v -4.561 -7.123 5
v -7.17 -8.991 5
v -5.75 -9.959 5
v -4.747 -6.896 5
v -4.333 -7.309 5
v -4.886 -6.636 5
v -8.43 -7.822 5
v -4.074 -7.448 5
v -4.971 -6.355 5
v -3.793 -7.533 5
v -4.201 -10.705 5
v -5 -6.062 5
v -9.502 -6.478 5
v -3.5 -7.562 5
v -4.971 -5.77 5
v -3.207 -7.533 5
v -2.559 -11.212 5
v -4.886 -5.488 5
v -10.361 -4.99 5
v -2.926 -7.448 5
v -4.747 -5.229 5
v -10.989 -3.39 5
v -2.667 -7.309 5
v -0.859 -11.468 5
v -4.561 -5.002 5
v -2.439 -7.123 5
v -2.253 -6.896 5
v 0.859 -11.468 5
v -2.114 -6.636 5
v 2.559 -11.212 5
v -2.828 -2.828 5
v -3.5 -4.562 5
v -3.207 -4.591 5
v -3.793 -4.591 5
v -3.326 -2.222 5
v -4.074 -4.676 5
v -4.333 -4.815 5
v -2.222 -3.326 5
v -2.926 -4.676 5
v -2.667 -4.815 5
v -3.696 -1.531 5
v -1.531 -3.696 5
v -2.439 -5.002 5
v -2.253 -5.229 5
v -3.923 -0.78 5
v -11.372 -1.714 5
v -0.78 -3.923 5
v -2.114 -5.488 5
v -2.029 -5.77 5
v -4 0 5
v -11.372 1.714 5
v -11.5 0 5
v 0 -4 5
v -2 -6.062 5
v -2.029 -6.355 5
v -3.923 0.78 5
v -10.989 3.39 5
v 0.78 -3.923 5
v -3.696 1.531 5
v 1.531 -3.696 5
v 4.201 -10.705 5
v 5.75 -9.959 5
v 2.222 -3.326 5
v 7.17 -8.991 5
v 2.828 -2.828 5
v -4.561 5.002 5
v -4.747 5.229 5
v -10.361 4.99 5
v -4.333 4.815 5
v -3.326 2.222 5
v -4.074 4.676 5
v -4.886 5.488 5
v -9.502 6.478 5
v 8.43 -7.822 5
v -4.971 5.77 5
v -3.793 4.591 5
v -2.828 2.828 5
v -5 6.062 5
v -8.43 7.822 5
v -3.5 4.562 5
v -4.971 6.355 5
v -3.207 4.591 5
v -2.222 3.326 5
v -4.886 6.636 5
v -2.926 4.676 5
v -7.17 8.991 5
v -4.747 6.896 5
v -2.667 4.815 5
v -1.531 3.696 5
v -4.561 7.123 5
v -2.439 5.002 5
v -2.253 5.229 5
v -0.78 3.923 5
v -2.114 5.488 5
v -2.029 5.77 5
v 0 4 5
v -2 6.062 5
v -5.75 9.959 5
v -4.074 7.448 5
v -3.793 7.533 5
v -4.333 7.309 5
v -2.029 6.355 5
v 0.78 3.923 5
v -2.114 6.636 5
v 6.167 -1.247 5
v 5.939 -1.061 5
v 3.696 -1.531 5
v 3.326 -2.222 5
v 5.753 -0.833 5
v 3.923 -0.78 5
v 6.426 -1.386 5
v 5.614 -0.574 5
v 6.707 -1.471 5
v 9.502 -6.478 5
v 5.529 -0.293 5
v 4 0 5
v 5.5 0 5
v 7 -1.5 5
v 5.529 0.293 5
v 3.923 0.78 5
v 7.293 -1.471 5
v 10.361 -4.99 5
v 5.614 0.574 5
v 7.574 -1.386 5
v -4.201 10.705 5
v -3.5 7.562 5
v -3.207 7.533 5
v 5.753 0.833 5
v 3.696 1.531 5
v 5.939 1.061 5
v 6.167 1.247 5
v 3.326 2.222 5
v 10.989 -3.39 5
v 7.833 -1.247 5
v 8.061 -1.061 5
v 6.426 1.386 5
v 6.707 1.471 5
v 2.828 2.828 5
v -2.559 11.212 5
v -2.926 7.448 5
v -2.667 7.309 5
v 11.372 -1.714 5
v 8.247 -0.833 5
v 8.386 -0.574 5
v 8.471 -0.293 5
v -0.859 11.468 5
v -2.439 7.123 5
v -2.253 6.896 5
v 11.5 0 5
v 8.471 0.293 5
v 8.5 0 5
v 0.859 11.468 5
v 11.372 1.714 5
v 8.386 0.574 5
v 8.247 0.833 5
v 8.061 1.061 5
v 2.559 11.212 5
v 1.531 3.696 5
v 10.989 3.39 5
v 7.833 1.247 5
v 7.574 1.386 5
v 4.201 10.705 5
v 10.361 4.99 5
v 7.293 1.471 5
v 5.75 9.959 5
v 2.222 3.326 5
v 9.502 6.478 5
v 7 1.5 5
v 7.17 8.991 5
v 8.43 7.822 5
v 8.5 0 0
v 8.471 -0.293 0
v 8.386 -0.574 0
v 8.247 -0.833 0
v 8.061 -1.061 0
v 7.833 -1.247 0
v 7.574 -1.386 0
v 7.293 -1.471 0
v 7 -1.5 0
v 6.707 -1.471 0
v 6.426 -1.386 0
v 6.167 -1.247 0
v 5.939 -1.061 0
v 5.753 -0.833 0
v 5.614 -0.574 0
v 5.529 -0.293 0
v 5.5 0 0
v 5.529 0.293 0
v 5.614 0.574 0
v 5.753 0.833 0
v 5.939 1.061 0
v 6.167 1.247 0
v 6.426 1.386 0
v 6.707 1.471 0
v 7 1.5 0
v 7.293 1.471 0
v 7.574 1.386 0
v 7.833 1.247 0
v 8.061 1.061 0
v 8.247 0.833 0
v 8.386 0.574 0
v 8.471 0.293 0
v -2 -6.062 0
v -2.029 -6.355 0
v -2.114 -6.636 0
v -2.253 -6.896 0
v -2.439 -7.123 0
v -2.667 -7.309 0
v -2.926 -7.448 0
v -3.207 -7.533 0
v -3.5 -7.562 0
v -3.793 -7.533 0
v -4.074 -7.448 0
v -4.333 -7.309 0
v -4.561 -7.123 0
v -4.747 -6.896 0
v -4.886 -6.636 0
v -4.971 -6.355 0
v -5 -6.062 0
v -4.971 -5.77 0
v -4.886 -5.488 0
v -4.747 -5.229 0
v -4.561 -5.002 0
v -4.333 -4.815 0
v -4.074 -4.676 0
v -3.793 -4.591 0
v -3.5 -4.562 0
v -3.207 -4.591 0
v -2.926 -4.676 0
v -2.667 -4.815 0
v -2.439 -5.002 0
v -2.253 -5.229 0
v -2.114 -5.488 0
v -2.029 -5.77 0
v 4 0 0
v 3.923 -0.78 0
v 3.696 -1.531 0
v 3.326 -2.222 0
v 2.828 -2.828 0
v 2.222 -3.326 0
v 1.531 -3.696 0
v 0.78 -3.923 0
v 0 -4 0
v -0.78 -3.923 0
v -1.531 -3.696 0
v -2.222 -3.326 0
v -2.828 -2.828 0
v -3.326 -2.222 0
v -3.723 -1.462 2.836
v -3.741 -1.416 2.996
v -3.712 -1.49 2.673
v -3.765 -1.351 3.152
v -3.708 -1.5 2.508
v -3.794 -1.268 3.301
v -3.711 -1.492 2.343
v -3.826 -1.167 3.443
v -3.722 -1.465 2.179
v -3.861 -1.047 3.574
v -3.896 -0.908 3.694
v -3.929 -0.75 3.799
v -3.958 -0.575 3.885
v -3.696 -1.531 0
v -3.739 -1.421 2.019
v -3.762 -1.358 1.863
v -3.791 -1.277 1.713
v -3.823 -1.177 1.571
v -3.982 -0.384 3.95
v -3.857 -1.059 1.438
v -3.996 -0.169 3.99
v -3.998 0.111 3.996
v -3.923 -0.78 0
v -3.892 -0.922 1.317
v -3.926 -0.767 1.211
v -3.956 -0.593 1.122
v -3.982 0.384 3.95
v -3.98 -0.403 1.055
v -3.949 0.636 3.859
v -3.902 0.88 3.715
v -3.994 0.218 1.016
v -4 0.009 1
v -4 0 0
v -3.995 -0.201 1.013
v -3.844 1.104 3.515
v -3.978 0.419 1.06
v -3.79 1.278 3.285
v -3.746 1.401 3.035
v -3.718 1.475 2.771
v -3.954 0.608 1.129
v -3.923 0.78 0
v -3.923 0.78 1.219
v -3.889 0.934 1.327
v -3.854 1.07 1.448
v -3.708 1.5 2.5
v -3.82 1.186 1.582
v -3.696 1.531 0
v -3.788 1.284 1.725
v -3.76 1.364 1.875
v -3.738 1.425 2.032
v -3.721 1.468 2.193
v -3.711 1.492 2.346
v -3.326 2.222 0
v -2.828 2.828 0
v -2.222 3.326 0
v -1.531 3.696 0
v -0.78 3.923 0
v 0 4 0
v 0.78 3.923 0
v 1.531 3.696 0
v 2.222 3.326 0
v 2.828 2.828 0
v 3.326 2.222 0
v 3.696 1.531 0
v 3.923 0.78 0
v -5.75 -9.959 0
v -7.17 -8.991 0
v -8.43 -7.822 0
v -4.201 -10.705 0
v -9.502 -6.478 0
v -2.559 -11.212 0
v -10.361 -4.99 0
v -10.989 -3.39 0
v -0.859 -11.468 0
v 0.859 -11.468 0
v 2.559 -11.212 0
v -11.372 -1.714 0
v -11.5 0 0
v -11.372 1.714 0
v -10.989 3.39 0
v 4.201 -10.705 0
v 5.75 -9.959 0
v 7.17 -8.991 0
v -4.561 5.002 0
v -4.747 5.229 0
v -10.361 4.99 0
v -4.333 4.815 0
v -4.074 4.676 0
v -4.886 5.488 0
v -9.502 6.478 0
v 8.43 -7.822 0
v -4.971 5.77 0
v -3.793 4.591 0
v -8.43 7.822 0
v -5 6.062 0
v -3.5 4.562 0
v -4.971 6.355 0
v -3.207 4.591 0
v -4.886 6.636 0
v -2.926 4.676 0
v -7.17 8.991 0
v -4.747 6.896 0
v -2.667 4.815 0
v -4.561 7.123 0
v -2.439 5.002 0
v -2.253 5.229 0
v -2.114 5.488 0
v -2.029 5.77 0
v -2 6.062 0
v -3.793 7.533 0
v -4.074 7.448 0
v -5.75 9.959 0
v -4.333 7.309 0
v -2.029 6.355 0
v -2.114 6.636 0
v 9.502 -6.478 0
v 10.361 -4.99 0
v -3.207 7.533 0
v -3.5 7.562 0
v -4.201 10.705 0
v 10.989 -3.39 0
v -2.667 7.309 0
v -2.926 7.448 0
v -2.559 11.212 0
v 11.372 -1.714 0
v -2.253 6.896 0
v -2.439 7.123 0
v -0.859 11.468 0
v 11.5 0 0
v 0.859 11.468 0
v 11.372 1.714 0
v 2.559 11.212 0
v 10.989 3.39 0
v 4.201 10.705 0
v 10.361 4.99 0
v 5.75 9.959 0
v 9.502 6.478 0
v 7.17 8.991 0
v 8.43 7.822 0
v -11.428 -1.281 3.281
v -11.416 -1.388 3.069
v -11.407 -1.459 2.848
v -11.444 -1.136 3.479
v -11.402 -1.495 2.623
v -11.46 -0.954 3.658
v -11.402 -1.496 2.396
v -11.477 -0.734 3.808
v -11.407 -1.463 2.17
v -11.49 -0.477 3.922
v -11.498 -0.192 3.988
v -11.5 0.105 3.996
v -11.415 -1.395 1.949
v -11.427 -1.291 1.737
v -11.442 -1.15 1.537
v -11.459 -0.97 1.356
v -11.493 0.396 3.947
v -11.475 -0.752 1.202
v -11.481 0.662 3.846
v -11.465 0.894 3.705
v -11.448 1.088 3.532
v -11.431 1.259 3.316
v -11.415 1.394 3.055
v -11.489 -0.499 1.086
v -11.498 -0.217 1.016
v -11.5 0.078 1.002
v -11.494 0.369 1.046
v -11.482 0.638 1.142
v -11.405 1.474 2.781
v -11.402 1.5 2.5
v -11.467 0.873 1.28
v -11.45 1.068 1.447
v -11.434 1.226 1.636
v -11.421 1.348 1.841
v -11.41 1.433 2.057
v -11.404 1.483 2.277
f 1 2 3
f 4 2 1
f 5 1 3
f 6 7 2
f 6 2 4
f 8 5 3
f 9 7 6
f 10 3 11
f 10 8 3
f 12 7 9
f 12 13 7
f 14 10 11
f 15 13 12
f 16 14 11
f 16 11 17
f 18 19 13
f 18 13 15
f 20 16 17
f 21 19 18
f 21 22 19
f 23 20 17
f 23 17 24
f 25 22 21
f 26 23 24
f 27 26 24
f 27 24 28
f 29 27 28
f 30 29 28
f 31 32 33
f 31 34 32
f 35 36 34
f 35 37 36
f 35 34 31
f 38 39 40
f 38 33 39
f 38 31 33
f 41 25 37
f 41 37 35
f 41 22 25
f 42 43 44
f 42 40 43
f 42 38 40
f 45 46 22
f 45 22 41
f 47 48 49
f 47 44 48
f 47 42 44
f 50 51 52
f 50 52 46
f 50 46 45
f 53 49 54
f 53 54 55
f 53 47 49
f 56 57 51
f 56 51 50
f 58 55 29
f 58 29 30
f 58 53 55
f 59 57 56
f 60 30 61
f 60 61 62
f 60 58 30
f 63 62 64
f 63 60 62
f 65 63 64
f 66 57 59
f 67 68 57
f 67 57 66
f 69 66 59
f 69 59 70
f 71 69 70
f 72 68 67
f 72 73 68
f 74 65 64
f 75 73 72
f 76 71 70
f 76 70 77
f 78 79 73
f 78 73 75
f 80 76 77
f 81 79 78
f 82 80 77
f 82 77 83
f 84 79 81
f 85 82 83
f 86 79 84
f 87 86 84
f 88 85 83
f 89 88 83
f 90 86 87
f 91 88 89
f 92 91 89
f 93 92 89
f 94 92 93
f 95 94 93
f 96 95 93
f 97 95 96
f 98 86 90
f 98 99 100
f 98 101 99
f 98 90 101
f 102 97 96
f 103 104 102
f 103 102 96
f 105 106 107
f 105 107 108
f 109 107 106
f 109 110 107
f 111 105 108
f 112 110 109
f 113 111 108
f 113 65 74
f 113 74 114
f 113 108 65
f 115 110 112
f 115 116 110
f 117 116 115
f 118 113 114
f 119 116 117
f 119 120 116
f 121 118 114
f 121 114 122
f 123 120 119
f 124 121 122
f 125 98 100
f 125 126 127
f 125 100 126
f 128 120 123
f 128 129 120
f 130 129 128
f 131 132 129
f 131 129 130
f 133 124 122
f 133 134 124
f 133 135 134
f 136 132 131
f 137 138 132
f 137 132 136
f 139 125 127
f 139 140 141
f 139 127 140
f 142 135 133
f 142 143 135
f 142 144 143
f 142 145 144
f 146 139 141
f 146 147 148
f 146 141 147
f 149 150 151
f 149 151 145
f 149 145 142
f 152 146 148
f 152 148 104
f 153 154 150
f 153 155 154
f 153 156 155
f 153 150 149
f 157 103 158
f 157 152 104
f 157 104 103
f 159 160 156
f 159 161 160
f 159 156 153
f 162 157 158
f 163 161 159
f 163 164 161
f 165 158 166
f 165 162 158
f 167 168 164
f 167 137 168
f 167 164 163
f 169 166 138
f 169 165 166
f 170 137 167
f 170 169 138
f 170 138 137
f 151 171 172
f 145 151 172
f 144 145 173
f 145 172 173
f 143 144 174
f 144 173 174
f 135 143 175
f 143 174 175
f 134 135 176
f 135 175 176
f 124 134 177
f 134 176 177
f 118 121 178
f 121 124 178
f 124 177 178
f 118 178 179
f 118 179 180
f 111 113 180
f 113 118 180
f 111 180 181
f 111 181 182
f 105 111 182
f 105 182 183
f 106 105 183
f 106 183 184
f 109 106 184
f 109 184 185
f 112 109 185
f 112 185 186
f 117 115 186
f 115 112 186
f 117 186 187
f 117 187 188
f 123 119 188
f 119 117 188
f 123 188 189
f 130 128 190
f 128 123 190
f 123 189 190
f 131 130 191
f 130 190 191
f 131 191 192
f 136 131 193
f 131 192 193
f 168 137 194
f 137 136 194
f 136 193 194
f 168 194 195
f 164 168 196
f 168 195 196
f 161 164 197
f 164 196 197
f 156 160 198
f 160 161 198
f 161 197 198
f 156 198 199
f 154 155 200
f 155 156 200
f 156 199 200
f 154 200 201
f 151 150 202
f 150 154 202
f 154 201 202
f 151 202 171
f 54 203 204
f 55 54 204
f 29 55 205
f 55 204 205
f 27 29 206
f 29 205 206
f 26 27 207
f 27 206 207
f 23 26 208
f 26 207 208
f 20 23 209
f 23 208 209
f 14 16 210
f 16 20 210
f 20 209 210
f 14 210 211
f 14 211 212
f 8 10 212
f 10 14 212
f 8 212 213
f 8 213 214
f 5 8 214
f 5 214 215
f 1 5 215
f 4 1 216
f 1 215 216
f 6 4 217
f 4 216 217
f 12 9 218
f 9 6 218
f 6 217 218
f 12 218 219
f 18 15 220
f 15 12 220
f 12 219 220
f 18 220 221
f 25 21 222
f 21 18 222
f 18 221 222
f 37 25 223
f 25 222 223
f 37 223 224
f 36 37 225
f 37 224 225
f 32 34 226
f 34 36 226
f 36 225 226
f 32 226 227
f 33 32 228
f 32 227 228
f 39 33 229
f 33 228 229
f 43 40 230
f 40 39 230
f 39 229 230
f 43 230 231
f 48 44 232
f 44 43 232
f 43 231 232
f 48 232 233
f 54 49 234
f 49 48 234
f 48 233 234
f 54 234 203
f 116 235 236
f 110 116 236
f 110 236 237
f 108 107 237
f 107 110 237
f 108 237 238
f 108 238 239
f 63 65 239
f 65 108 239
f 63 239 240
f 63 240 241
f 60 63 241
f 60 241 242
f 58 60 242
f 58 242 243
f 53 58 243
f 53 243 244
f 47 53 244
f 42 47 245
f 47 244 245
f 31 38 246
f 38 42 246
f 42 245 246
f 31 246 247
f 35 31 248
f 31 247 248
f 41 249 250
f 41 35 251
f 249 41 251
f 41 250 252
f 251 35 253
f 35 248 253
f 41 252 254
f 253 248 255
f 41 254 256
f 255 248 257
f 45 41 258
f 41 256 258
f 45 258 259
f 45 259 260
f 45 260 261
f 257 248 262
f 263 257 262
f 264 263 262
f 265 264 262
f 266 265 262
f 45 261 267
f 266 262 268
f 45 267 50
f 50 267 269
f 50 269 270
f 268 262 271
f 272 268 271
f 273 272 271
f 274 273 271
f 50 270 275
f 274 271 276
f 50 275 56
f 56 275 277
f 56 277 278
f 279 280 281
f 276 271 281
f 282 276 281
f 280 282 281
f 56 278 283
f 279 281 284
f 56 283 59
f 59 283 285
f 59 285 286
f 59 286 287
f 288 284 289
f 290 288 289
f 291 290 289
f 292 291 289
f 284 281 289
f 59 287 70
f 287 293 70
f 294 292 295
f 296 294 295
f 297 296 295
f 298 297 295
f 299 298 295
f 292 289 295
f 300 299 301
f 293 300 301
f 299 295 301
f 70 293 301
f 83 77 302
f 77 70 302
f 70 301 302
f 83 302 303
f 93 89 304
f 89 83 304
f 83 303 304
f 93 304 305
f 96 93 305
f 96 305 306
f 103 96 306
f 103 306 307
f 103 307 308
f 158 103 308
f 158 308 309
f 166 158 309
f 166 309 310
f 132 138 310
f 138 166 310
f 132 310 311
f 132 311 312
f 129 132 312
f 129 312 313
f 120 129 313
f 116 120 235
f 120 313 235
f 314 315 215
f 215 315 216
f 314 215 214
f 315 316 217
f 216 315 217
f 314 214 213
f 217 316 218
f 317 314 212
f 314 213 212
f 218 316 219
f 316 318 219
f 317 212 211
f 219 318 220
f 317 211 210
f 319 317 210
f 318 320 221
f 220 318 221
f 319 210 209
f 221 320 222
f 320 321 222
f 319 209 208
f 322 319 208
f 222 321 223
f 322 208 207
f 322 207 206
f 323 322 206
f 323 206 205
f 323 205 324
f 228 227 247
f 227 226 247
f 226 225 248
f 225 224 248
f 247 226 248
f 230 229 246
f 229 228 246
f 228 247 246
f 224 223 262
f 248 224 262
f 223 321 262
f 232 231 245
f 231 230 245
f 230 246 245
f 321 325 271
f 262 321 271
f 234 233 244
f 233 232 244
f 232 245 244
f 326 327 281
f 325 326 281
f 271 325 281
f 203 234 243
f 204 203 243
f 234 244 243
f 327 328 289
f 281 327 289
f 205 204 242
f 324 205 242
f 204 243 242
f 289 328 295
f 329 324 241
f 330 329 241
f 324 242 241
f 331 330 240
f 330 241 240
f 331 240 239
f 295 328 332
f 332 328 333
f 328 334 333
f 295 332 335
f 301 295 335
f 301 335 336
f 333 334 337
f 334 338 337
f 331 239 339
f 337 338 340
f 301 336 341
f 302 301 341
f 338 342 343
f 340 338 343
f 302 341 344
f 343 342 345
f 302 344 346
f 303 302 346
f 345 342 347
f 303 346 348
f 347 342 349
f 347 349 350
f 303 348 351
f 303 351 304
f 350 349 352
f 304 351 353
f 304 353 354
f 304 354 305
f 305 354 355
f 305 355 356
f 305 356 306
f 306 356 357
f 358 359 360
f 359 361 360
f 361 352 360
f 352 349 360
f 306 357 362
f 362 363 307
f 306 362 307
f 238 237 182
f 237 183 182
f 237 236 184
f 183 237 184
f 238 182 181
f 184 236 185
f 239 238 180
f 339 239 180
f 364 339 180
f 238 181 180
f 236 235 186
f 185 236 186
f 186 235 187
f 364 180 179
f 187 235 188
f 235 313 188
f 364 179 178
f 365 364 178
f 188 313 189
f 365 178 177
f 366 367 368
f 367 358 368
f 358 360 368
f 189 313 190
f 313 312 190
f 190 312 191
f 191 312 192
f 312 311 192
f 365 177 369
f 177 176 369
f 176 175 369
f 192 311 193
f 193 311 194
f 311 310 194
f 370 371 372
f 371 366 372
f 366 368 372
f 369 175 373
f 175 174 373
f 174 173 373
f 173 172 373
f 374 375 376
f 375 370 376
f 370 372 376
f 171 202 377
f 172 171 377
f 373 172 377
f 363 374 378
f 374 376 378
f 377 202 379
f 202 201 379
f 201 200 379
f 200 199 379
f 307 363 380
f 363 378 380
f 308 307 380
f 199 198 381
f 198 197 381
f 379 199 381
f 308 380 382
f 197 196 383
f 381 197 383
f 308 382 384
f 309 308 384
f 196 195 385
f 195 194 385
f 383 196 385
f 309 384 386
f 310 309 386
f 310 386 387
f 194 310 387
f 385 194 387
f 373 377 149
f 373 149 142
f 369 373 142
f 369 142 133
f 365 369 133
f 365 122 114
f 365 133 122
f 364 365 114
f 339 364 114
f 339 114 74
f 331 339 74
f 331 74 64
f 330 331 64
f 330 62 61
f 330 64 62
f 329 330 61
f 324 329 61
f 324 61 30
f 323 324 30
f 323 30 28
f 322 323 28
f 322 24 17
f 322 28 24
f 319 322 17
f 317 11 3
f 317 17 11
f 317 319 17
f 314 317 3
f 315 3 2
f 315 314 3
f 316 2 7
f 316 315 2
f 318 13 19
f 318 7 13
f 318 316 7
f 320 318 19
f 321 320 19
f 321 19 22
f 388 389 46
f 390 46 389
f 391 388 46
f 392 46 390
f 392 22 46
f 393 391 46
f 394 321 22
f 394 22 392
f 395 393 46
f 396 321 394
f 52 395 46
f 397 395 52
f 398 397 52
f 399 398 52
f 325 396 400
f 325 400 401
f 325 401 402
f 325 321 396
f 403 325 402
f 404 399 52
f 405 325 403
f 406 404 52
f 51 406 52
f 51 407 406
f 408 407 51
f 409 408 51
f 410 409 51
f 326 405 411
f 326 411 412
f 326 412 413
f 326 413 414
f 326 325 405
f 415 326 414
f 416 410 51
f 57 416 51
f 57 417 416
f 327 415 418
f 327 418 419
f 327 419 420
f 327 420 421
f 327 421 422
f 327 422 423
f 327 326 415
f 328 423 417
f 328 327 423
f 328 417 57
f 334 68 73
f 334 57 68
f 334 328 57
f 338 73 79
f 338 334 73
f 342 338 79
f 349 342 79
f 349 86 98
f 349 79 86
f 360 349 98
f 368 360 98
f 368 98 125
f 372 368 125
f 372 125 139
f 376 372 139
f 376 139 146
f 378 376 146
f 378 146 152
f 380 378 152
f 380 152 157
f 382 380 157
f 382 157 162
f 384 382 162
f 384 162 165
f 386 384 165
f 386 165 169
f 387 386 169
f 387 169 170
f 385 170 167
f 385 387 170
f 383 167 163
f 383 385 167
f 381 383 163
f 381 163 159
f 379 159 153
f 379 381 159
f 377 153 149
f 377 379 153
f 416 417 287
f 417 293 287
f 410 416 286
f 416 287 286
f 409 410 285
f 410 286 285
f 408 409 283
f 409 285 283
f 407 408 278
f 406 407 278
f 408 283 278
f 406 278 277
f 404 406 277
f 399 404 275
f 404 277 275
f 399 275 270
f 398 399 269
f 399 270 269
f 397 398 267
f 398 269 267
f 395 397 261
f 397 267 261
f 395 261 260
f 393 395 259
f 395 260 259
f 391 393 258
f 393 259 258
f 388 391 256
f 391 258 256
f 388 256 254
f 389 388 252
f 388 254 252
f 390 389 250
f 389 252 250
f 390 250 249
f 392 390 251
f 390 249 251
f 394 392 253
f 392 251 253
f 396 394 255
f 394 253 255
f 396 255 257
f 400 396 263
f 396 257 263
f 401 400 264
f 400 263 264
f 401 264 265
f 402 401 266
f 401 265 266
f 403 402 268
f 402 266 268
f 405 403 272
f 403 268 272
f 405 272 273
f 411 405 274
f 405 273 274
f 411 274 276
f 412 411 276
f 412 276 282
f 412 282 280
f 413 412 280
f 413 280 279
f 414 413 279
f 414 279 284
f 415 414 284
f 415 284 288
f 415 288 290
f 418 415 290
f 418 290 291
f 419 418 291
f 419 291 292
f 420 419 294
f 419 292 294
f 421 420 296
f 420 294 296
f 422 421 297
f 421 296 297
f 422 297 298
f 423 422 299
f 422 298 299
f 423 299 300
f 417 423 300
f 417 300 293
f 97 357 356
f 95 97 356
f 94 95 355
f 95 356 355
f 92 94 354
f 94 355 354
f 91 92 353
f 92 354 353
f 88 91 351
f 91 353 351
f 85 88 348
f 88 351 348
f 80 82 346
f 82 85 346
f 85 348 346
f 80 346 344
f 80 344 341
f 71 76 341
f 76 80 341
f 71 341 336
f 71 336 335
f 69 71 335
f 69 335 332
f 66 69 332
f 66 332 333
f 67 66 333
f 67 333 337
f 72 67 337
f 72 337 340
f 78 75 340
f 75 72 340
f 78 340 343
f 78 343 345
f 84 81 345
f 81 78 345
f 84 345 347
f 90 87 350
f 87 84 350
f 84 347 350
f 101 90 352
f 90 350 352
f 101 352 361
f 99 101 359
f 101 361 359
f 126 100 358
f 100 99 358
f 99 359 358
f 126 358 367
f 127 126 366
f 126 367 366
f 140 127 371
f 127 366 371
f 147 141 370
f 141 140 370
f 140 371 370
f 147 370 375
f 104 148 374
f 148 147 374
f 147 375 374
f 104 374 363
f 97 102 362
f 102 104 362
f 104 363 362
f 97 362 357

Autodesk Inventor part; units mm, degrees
ref_plane "YZ Plane" through (0, 0, 0) normal (1, 0, 0) x (0, 1, 0)
ref_plane "XZ Plane" through (0, 0, 0) normal (0, 1, 0) x (-1, 0, 0)
ref_plane "XY Plane" through (0, 0, 0) normal (0, 0, 1) x (1, 0, 0)
sketch "Sketch3" plane through (0, 0, 0) normal (0, 0, 1) x (1, 0, 0)
  circle A0 centre (0, 0) radius 11.5
  circle A1 centre (0, 0) radius 4
  circle A2 centre (7, 0) radius 1.5
  circle A3 centre (3.5, 6.0622) radius 1.5
  circle A4 centre (-3.5, 6.0622) radius 1.5
  circle A5 centre (-7, 0) radius 1.5
  circle A6 centre (-3.5, -6.0622) radius 1.5
  circle A7 centre (3.5, -6.0622) radius 1.5
  dimension "d0" = 23
  dimension "d1" = 8
  dimension "d4" = 3
  dimension "d5" = 7
  dimension "d12" = 360
extrude "Extrusion1" add sketch "Sketch3" along normal blind 5 contours A0 | A3 | A5 | A7
sketch "Sketch4" plane through (0, 0, 0) normal (1, 0, 0) x (0, 1, 0)
  line L0 (-11.5, 0) -> (11.5, 0) projected
  line L1 (-4, 5) -> (4, 5) projected
  line L2 (4, 0) -> (-4, 0) projected
  circle A0 centre (0, 2.5) radius 1.5
  line L3 (4, 0) -> (4, 5) projected
  point P0 (0, 0)
  point P1 (0, 0)
  point P2 (4, 2.5)
  dimension "d14" = 3
extrude "Extrusion2" cut sketch "Sketch4" against normal through all
thread "Thread1" size "M3x0.5" class "6H" standard "ANSI Metric M Profile" full length
thread "Thread2" size "M3x0.5" class "6H" standard "ANSI Metric M Profile" full length
thread "Thread3" size "M3x0.5" class "6H" standard "ANSI Metric M Profile" full length
thread "Thread4" size "M3x0.5" class "6H" standard "ANSI Metric M Profile" full length
equation "\"d15\" = d14"
properties part number "6mm Mounting Hub, thin" material "Aluminum 6061"
